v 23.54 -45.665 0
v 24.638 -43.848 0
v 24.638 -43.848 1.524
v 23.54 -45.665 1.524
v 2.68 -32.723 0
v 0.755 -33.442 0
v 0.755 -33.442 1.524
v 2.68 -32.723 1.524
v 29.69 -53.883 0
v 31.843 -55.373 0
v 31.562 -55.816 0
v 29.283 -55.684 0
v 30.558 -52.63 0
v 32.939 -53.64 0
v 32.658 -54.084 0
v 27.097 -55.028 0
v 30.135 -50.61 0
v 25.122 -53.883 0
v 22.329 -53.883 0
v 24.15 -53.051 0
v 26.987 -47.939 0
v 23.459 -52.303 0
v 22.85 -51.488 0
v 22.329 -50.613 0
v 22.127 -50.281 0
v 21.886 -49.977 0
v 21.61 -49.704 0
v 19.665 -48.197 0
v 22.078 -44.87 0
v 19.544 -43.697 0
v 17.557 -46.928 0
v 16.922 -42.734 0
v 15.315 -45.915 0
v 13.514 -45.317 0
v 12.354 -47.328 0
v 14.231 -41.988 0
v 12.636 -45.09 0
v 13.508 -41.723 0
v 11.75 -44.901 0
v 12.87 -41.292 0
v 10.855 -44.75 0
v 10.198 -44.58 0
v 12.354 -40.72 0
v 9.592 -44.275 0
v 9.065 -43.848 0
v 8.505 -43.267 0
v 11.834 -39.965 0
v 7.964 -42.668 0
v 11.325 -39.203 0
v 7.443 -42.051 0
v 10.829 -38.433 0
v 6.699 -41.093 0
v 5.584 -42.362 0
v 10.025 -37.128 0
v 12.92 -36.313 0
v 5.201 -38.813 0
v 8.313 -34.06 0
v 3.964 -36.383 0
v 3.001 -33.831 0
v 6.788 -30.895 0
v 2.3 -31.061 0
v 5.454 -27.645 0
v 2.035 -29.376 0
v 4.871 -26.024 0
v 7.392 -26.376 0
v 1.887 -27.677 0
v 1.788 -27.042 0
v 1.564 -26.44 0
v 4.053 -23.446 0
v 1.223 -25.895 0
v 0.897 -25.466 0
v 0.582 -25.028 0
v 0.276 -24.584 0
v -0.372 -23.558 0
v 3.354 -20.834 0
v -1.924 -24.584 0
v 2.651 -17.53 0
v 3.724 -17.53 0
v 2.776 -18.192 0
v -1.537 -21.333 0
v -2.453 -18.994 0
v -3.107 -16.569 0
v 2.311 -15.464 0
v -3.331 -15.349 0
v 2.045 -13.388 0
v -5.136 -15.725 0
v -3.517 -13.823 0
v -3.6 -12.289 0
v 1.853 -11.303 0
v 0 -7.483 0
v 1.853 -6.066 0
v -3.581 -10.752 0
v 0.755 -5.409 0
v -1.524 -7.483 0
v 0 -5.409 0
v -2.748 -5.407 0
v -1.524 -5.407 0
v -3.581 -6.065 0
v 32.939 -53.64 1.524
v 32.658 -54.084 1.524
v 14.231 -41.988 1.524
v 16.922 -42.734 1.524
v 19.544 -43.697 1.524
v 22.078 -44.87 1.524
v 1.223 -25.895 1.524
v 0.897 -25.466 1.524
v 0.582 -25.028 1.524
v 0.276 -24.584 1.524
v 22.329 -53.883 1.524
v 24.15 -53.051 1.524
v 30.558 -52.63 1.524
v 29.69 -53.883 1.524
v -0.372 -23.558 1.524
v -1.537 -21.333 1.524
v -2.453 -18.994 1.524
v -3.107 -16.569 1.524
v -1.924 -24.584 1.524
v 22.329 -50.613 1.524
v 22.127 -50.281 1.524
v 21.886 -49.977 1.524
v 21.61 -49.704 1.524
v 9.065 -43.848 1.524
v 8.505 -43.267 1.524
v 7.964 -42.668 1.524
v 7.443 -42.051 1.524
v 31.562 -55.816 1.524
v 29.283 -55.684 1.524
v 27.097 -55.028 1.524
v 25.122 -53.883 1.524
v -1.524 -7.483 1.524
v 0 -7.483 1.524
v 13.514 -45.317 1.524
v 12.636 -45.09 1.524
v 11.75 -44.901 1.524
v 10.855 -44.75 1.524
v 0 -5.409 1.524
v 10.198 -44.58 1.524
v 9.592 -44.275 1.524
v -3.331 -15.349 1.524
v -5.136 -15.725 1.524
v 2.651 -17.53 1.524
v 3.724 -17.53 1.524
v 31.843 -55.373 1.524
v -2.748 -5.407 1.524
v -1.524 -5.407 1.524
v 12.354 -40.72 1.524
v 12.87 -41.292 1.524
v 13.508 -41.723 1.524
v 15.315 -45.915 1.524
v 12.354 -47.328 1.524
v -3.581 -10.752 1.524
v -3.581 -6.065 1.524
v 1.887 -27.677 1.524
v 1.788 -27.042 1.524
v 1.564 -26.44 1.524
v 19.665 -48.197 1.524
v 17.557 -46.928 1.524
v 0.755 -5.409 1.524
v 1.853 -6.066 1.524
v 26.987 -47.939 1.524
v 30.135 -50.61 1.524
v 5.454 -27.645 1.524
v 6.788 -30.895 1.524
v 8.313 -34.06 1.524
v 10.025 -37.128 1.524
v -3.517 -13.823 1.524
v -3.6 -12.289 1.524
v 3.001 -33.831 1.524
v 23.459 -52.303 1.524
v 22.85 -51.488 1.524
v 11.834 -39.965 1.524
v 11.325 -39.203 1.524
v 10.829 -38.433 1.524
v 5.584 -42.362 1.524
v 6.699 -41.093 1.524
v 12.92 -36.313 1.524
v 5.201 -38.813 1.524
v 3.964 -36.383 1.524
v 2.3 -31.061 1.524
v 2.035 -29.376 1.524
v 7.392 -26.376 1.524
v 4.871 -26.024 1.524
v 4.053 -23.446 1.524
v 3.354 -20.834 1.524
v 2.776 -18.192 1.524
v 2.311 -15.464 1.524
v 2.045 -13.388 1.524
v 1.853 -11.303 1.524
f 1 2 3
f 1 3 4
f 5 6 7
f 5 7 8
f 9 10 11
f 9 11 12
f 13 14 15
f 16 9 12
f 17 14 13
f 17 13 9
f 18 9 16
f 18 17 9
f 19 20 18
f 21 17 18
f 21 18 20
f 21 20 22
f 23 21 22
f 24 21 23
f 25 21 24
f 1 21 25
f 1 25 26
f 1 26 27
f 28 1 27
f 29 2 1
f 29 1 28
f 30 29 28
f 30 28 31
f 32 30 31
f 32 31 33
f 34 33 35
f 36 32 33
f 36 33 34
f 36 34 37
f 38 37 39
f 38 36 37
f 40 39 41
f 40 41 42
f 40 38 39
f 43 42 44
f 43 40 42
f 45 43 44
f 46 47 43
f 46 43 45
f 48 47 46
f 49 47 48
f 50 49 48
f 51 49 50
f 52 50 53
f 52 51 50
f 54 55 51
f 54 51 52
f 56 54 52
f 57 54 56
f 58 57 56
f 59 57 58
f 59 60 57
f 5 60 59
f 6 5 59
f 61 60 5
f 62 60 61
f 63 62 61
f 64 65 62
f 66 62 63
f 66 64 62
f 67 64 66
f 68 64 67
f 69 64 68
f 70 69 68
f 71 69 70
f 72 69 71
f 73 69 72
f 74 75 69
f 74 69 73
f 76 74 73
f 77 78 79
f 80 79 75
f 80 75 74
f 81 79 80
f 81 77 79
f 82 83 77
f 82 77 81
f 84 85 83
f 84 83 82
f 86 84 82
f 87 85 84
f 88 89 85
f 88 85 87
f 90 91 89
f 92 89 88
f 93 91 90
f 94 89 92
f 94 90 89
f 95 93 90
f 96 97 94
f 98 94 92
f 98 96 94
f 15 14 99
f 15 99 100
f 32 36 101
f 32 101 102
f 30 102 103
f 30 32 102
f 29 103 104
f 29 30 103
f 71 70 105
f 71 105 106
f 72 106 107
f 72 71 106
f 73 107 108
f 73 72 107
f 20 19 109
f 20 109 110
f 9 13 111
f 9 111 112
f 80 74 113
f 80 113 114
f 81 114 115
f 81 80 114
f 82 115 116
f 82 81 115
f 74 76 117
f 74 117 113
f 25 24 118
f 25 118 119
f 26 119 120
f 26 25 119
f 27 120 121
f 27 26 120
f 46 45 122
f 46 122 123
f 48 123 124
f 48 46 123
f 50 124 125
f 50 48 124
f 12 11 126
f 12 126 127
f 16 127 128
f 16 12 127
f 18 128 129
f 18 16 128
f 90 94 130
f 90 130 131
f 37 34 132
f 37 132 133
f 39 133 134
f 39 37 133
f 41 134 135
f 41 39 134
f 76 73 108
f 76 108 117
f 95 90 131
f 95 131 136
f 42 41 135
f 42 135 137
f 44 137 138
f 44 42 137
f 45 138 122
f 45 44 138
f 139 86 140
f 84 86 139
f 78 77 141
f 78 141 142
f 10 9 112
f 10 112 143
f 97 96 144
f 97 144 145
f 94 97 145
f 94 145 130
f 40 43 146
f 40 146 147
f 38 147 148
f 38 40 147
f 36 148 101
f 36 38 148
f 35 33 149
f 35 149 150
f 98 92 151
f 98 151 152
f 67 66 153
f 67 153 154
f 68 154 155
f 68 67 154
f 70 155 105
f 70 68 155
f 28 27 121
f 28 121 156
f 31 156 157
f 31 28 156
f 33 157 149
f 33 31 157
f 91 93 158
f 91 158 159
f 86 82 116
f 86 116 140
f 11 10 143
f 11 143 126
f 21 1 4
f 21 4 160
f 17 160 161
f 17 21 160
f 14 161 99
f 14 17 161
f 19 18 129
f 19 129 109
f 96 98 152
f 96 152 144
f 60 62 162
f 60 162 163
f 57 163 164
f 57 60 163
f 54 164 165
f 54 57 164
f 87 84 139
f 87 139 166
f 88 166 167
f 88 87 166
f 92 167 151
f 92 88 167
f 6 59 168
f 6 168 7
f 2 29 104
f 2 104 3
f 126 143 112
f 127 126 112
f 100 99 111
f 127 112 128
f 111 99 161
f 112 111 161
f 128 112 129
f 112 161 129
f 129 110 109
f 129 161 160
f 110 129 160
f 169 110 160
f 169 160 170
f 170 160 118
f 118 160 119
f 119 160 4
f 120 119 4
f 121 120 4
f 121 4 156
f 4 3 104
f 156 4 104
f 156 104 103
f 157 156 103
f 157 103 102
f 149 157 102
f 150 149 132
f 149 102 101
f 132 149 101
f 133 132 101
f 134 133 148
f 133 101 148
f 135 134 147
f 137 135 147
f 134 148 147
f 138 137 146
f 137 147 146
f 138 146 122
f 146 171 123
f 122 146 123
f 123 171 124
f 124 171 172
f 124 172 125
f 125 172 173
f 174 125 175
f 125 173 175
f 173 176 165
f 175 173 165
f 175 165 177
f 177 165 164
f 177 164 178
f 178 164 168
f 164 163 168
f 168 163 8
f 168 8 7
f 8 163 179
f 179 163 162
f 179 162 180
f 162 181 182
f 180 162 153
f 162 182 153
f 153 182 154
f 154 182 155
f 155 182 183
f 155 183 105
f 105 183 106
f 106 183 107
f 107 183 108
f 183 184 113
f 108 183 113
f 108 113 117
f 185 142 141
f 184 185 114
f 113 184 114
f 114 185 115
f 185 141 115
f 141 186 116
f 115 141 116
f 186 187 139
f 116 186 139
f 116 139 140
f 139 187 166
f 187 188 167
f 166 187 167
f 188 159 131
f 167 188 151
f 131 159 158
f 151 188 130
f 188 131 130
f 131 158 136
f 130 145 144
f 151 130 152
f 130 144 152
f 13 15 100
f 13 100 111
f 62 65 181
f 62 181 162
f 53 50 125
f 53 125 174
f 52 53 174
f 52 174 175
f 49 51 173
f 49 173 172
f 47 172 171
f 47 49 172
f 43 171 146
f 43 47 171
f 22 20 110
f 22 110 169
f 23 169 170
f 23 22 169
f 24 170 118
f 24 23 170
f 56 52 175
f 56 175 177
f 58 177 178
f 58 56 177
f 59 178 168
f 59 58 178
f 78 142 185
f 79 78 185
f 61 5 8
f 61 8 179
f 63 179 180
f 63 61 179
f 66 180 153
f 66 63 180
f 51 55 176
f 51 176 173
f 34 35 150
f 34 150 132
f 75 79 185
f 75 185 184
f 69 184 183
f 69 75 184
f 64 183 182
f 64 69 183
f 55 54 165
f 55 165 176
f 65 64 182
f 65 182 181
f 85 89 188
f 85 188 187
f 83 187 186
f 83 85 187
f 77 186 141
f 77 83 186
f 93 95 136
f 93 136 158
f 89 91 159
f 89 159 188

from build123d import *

# Parameters (mm, degrees)
BOSS_EXTRUDE1_DEPTH = 1.524


with BuildPart() as part:
    # Sketch1 → Boss-Extrude1 (new body)
    with BuildSketch(Plane.XY):
        with BuildLine():
            Line((0, -7.482967549), (0, -5.408604084))
            Line((0, -5.408604084), (0.755403654, -5.408604084))
            Line((0.755403654, -5.408604084), (1.852982052, -6.066483394))
            Line((1.852982052, -6.066483394), (1.852982052, -11.302742268))
            ThreePointArc((1.852982052, -11.302742268), (2.169015936, -14.427077895), (2.651362341, -17.530091345))
            Line((2.651362341, -17.530091345), (3.723597325, -17.530091345))
            Line((3.723597325, -17.530091345), (2.776349352, -18.191976001))
            ThreePointArc((2.776349352, -18.191976001), (3.688558171, -22.143924571), (4.870971382, -26.023605155))
            Line((4.870971382, -26.023605155), (7.391844245, -26.375500189))
            Line((7.391844245, -26.375500189), (5.453722899, -27.64535428))
            ThreePointArc((5.453722899, -27.64535428), (7.526914303, -32.489040294), (10.025271266, -37.127750167))
            Line((10.025271266, -37.127750167), (12.920376423, -36.313179973))
            Line((12.920376423, -36.313179973), (10.828892653, -38.432980418))
            ThreePointArc((10.828892653, -38.432980418), (11.578167935, -39.585157678), (12.354161774, -40.719511876))
            ThreePointArc((12.354161774, -40.719511876), (13.175512701, -41.52681366), (14.230806956, -41.988015948))
            ThreePointArc((14.230806956, -41.988015948), (18.242644995, -43.188625247), (22.0780899, -44.869598037))
            Line((22.0780899, -44.869598037), (24.637655179, -43.847936826))
            Line((24.637655179, -43.847936826), (23.540004987, -45.665371924))
            ThreePointArc((23.540004987, -45.665371924), (28.601111191, -49.226757072), (32.939174514, -53.640311963))
            Line((32.939174514, -53.640311963), (32.658498476, -54.083761868))
            Line((32.658498476, -54.083761868), (30.557652989, -52.629850356))
            Line((30.557652989, -52.629850356), (29.690386669, -53.883016398))
            Line((29.690386669, -53.883016398), (31.842754445, -55.372584435))
            Line((31.842754445, -55.372584435), (31.562078407, -55.81603434))
            ThreePointArc((31.562078407, -55.81603434), (28.171023999, -55.419868819), (25.12237155, -53.883016398))
            Line((25.12237155, -53.883016398), (22.328692601, -53.883016398))
            Line((22.328692601, -53.883016398), (24.149817082, -53.050998637))
            ThreePointArc((24.149817082, -53.050998637), (23.14393246, -51.90329893), (22.328692601, -50.613181701))
            ThreePointArc((22.328692601, -50.613181701), (22.010972611, -50.125385322), (21.609531214, -49.703797722))
            ThreePointArc((21.609531214, -49.703797722), (18.629634099, -47.531264185), (15.315052581, -45.914712875))
            Line((15.315052581, -45.914712875), (12.354161774, -47.327855997))
            Line((12.354161774, -47.327855997), (13.514091924, -45.317136512))
            ThreePointArc((13.514091924, -45.317136512), (12.19400152, -44.990393779), (10.855498604, -44.749957856))
            ThreePointArc((10.855498604, -44.749957856), (9.886950862, -44.4440491), (9.0645671, -43.847936826))
            ThreePointArc((9.0645671, -43.847936826), (8.232032183, -42.969369623), (7.443407514, -42.051183451))
            Line((7.443407514, -42.051183451), (5.583711581, -42.361832951))
            Line((5.583711581, -42.361832951), (6.698610636, -41.092910194))
            ThreePointArc((6.698610636, -41.092910194), (4.549160992, -37.615074341), (3.001052455, -33.831050562))
            Line((3.001052455, -33.831050562), (0.755403654, -33.442087733))
            Line((0.755403654, -33.442087733), (2.67955584, -32.723173894))
            ThreePointArc((2.67955584, -32.723173894), (2.152644596, -30.220357528), (1.886622718, -27.676549835))
            ThreePointArc((1.886622718, -27.676549835), (1.691331674, -26.735134405), (1.223200745, -25.895339764))
            ThreePointArc((1.223200745, -25.895339764), (0.738155144, -25.247811098), (0.2762274, -24.583593236))
            Line((0.2762274, -24.583593236), (-1.923937021, -24.583593236))
            Line((-1.923937021, -24.583593236), (-0.371702809, -23.55840282))
            ThreePointArc((-0.371702809, -23.55840282), (-2.026872481, -20.176102129), (-3.106855858, -16.568723508))
            Line((-3.106855858, -16.568723508), (-5.135572794, -15.725098738))
            Line((-5.135572794, -15.725098738), (-3.3310132, -15.34916898))
            ThreePointArc((-3.3310132, -15.34916898), (-3.571541774, -13.056715378), (-3.580970503, -10.751697242))
            Line((-3.580970503, -10.751697242), (-3.580970503, -6.064514361))
            Line((-3.580970503, -6.064514361), (-2.747975023, -5.406635051))
            Line((-2.747975023, -5.406635051), (-1.524, -5.406635051))
            Line((-1.524, -5.406635051), (-1.524, -7.482967549))
            Line((-1.524, -7.482967549), (0, -7.482967549))
        make_face()
    extrude(amount=BOSS_EXTRUDE1_DEPTH)


solid = part.part
